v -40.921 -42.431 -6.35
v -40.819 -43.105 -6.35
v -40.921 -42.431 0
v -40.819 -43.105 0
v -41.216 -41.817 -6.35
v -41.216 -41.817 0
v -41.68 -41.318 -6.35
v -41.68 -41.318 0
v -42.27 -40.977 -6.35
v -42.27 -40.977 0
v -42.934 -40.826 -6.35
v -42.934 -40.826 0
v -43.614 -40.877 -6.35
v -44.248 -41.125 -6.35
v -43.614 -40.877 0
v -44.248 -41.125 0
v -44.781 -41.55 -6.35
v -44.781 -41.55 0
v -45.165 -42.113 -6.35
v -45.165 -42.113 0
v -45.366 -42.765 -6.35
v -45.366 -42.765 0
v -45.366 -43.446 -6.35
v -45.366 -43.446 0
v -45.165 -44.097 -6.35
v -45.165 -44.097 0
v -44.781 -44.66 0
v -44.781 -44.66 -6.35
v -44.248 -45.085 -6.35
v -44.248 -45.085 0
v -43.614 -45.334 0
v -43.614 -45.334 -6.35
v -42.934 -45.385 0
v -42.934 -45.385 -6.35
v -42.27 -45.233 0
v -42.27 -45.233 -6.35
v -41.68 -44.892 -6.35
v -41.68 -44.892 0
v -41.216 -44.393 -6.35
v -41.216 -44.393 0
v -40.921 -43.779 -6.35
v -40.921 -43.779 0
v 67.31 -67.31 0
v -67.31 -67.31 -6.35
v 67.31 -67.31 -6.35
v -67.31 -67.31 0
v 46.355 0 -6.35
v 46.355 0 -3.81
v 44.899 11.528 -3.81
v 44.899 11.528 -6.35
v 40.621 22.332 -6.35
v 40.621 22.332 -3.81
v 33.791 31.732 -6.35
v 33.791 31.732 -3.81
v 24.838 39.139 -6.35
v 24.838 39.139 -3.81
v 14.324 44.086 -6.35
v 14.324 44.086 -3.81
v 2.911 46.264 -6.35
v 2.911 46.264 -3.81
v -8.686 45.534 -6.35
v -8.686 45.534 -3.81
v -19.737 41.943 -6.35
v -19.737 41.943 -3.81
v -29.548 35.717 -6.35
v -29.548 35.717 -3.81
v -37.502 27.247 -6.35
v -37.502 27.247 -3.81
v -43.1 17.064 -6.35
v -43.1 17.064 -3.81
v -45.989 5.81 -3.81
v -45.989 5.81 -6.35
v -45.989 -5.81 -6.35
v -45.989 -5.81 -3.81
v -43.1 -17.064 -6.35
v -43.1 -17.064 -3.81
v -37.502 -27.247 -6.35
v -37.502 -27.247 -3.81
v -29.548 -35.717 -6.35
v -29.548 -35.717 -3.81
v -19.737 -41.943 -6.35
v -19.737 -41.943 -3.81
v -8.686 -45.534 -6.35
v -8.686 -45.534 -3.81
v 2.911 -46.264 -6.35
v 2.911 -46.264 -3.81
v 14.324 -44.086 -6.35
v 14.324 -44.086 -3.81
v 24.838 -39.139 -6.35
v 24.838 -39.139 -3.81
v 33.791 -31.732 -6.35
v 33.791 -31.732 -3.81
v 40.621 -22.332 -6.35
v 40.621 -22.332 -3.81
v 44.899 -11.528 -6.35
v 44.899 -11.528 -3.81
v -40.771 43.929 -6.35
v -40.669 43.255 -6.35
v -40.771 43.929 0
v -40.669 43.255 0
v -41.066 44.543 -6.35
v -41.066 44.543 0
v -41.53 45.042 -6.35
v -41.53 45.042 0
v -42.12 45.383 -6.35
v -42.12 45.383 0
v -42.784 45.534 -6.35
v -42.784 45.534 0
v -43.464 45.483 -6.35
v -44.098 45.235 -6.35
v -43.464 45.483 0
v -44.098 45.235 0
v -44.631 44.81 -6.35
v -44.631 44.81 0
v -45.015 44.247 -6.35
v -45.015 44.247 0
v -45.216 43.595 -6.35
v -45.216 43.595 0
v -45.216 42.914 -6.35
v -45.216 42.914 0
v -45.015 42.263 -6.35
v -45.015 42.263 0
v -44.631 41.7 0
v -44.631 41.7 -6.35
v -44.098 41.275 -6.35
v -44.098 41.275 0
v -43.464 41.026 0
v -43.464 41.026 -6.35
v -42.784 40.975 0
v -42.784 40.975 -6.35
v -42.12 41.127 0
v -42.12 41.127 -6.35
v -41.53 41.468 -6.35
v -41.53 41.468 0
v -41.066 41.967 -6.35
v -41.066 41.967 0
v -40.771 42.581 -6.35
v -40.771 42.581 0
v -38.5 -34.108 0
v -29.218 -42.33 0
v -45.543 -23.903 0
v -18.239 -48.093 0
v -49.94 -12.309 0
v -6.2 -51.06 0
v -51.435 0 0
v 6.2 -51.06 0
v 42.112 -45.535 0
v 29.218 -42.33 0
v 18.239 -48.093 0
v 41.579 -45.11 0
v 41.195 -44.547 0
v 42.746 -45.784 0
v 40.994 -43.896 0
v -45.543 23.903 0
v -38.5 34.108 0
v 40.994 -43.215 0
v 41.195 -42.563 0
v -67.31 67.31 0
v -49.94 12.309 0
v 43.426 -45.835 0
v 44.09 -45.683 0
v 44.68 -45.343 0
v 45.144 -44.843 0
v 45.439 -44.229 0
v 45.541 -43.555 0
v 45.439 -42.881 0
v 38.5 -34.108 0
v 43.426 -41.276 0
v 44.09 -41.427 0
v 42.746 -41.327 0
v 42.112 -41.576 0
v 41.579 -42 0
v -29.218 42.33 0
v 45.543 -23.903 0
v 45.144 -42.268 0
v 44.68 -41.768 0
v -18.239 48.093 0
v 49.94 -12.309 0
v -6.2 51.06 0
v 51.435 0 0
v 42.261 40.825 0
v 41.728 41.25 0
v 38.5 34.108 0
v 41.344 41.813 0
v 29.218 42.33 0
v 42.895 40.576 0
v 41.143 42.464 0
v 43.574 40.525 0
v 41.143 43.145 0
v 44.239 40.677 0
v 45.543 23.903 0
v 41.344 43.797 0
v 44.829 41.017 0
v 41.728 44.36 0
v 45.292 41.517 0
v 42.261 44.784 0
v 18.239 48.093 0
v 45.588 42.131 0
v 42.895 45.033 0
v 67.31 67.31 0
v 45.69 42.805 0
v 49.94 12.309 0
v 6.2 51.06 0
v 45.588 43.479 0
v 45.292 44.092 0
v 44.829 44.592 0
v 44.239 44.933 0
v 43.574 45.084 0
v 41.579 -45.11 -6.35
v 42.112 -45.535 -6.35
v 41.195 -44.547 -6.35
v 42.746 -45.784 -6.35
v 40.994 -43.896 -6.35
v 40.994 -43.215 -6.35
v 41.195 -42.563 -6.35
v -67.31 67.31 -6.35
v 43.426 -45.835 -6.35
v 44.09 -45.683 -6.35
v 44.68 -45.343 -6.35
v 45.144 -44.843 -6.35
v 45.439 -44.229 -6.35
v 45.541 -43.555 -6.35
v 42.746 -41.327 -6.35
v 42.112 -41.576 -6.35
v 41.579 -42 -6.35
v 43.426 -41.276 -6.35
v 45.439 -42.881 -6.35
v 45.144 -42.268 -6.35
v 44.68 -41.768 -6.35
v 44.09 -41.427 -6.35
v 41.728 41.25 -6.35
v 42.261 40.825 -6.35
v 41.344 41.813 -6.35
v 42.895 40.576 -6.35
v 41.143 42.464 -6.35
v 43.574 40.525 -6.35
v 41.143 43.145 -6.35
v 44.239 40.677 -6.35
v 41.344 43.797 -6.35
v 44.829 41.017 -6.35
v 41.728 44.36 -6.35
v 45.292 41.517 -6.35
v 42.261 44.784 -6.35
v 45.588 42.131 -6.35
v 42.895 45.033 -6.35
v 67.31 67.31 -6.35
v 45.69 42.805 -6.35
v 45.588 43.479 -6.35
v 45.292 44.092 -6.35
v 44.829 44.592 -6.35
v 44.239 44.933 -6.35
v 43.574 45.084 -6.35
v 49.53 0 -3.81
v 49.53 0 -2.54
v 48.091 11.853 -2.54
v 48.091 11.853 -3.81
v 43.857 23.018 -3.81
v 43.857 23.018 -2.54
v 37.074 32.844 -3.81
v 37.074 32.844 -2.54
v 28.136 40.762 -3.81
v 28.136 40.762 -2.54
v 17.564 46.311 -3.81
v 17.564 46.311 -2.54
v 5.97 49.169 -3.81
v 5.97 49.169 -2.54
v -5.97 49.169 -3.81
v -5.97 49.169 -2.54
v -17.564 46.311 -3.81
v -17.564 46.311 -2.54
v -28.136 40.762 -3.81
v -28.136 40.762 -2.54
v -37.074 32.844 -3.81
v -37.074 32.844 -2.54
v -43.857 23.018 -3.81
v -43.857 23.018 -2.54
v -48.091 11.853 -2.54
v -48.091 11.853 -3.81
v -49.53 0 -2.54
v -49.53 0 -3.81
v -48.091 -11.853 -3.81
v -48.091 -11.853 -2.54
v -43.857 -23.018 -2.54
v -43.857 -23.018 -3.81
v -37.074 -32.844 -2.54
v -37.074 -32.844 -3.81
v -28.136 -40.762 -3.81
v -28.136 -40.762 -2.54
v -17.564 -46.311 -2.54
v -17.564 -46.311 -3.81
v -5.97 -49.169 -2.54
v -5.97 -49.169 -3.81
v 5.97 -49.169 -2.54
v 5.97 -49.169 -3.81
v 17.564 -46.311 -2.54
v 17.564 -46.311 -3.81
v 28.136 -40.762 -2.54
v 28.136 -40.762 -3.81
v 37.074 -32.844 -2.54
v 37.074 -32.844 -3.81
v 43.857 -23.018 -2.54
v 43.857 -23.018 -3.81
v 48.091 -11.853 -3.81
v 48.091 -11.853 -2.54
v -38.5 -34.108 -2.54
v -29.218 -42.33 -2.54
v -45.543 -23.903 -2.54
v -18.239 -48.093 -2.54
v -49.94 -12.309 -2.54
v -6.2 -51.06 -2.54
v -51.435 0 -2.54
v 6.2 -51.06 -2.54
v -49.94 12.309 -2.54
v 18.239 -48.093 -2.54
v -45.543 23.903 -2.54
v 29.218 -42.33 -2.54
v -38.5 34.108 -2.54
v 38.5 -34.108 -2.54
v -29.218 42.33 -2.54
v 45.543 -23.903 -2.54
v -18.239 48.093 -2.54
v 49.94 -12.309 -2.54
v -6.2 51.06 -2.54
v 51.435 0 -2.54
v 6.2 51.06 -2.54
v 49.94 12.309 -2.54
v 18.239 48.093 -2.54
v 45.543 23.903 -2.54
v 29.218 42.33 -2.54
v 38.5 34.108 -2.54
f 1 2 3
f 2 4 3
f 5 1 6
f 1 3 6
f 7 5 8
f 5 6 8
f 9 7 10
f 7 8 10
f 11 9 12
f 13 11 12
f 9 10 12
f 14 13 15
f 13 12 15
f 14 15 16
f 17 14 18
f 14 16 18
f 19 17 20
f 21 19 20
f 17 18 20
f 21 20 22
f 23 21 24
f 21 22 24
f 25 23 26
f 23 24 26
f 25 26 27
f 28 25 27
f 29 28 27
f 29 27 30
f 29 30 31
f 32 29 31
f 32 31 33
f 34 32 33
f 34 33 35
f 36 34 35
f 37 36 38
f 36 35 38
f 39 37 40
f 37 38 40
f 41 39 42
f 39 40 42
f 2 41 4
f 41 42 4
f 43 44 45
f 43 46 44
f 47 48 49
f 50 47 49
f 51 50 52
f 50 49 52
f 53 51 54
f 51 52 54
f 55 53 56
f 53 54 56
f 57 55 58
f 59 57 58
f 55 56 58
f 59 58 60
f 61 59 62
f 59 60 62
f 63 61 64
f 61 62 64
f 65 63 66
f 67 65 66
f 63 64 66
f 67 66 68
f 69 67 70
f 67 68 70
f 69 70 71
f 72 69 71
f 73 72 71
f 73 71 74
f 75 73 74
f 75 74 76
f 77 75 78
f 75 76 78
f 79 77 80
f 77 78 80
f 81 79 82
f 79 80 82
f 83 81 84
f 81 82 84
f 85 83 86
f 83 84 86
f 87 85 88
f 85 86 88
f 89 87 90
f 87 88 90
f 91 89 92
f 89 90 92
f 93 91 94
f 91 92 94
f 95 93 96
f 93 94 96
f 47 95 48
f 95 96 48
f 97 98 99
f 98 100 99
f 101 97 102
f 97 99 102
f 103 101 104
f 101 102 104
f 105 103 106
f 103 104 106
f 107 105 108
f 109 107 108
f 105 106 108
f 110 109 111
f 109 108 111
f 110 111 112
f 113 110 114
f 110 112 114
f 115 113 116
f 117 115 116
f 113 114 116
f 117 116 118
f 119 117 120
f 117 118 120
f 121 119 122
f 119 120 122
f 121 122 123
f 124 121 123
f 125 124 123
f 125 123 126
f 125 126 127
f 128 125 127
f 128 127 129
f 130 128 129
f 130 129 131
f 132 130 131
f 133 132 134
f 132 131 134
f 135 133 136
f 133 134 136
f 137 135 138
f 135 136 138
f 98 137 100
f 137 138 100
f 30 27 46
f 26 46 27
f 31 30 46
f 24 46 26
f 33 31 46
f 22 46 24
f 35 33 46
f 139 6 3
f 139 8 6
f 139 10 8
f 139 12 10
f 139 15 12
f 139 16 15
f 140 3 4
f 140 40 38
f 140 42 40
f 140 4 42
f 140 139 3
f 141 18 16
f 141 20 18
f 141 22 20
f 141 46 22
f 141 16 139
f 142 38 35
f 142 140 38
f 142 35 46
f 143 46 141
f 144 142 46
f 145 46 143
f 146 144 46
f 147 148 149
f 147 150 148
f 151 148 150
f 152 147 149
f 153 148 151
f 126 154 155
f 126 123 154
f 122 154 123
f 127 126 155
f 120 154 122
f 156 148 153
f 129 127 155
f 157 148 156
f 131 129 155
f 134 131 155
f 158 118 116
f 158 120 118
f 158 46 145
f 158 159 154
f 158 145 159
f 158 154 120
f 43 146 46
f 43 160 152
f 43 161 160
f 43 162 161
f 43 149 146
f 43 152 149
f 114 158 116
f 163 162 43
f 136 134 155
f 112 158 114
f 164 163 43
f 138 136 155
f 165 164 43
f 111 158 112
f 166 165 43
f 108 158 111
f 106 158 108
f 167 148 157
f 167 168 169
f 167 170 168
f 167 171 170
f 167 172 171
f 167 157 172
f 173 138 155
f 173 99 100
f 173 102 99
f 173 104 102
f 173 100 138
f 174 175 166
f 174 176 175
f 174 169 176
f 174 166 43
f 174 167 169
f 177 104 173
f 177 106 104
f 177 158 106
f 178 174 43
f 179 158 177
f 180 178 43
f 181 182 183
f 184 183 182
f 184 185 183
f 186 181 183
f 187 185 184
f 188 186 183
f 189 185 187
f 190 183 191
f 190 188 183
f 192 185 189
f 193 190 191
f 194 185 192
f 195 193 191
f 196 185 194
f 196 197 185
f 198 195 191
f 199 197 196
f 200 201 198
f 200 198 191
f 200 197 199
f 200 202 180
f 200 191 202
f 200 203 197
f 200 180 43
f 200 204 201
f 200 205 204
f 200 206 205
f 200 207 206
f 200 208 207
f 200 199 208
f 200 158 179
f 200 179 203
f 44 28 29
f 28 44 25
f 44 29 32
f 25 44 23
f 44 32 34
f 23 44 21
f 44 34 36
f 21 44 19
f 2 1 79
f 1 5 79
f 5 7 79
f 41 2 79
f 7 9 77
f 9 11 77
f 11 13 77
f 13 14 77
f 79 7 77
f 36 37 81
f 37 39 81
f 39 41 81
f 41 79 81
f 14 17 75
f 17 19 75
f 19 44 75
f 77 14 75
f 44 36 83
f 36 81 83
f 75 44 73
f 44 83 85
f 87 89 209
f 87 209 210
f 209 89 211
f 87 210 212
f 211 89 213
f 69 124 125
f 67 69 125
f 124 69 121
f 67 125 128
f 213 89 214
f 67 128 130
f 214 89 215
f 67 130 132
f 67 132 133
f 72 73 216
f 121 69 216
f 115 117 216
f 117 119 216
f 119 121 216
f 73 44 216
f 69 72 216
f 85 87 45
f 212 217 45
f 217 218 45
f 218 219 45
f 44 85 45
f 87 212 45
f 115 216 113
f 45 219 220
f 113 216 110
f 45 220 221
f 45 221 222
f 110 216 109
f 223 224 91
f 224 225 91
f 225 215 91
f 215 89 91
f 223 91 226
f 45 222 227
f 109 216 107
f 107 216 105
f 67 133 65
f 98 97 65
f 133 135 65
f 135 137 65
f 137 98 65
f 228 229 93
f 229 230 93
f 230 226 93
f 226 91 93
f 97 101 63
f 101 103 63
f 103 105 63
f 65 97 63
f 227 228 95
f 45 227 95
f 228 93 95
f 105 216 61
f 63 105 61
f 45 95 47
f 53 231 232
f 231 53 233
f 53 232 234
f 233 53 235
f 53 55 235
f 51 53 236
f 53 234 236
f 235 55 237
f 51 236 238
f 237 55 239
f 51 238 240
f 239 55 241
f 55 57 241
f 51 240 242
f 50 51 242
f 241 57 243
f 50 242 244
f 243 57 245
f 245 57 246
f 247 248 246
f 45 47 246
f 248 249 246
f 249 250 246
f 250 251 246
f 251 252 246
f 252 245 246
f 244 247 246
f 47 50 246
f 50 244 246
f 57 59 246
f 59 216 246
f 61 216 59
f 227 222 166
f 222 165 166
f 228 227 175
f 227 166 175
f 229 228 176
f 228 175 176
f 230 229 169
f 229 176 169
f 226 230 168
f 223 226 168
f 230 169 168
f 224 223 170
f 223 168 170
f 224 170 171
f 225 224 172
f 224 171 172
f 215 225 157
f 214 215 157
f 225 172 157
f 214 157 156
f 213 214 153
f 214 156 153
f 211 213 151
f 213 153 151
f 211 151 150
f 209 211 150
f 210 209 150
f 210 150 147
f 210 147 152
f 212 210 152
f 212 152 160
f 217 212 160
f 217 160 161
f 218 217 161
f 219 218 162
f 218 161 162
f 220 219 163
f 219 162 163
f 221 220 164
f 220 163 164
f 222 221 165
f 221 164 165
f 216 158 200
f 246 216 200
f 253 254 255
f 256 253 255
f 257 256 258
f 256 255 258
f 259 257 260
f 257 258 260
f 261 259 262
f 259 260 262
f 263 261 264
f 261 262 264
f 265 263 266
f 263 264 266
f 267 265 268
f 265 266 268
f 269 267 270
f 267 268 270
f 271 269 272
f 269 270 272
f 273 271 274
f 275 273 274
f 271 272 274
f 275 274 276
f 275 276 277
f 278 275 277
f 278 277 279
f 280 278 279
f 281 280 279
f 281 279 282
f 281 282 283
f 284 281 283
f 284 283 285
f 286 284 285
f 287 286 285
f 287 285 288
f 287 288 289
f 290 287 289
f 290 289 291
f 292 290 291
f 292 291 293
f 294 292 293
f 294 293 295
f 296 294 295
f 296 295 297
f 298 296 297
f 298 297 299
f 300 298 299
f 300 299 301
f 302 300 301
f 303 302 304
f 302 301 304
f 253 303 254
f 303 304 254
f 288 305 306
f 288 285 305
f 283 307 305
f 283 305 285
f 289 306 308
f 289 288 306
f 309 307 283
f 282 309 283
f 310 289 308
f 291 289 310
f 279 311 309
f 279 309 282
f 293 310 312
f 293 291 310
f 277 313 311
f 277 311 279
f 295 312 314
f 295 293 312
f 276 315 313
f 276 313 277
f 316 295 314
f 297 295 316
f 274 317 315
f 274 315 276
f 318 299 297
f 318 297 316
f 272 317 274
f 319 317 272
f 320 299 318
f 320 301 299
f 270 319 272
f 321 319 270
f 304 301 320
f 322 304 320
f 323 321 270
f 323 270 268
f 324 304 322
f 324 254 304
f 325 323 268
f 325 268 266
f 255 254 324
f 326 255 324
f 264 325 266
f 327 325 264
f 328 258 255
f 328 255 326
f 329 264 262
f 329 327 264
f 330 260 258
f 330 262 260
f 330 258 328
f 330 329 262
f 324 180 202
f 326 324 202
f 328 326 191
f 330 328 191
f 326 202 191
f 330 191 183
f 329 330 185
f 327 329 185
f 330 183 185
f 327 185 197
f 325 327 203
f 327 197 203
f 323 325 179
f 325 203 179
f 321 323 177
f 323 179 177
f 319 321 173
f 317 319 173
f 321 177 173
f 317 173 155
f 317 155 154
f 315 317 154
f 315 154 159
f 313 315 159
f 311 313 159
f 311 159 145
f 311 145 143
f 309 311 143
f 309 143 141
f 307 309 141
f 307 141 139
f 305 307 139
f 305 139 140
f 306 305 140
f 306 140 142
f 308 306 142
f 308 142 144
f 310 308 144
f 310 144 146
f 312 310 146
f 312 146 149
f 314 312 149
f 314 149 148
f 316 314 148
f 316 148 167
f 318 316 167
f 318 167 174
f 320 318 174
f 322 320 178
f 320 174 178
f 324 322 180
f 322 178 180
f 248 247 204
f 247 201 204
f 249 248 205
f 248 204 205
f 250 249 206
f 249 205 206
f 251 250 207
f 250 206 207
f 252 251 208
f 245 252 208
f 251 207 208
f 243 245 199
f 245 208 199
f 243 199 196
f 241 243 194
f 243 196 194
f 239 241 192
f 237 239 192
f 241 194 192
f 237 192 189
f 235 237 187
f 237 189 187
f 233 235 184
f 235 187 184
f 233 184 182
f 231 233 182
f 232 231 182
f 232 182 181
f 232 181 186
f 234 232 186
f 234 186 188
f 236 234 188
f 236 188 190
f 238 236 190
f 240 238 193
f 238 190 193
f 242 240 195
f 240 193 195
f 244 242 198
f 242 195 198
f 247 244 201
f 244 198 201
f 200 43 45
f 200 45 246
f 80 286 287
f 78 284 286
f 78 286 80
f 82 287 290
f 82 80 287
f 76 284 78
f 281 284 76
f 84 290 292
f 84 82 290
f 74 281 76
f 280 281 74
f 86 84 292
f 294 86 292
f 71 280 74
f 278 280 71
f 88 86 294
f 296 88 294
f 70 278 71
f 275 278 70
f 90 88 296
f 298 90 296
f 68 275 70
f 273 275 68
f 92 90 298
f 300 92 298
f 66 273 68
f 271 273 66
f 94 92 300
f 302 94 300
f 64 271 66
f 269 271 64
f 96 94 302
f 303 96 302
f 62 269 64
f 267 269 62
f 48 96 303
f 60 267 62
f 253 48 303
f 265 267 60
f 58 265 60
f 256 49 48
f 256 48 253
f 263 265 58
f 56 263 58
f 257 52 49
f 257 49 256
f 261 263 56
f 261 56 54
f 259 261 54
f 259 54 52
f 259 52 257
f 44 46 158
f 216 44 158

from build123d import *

# Parameters (mm, degrees)
F0_W     = 134.62
F0_H     = 134.62
F0_R     = 2.286
F0_R_2   = 51.435
F4_DEPTH = 6.35
F2_W     = 134.62
F2_H     = 134.62
F2_R     = 2.286
F2_R_2   = 49.53
F7_DEPTH = 3.81
F6_W     = 134.62
F6_H     = 134.62
F6_R     = 2.286
F6_R_2   = 46.355
F8_DEPTH = 2.54


# Not quite as in the source:
# - the program builds the solid bodies; features that only make, move or delete a surface that nothing else refers to are left out


with BuildPart() as f4:
    # F0 (on Top) → F4 (new body)
    with BuildSketch(Plane.XY):
        Rectangle(F0_W, F0_H)
        with Locations((-43.1052293811, -43.1052293811)):
            Circle(F0_R, mode=Mode.SUBTRACT)
        with Locations((43.2547706189, -43.5552815736)):
            Circle(F0_R, mode=Mode.SUBTRACT)
        with Locations((-42.9551675437, 43.2547706189)):
            Circle(F0_R, mode=Mode.SUBTRACT)
        Circle(F0_R_2, mode=Mode.SUBTRACT)
        with Locations((43.4036597586, 42.8047184264)):
            Circle(F0_R, mode=Mode.SUBTRACT)
    extrude(amount=-F4_DEPTH)

    # F2 (on offset) → F7 (join)
    with BuildSketch(Plane.XY.offset(-2.54)):
        Rectangle(F2_W, F2_H)
        with Locations((-43.1052293811, -43.1052293811)):
            Circle(F2_R, mode=Mode.SUBTRACT)
        with Locations((43.2547706189, -43.5552815736)):
            Circle(F2_R, mode=Mode.SUBTRACT)
        with Locations((-42.9551675437, 43.2547706189)):
            Circle(F2_R, mode=Mode.SUBTRACT)
        Circle(F2_R_2, mode=Mode.SUBTRACT)
        with Locations((43.4036597586, 42.8047184264)):
            Circle(F2_R, mode=Mode.SUBTRACT)
    extrude(amount=-F7_DEPTH)

    # F6 (on offset) → F8 (join)
    with BuildSketch(Plane.XY.offset(-3.81)):
        Rectangle(F6_W, F6_H)
        with Locations((-43.1052293811, -43.1052293811)):
            Circle(F6_R, mode=Mode.SUBTRACT)
        with Locations((43.2547706189, -43.5552815736)):
            Circle(F6_R, mode=Mode.SUBTRACT)
        with Locations((-42.9551675437, 43.2547706189)):
            Circle(F6_R, mode=Mode.SUBTRACT)
        Circle(F6_R_2, mode=Mode.SUBTRACT)
        with Locations((43.4036597586, 42.8047184264)):
            Circle(F6_R, mode=Mode.SUBTRACT)
    extrude(amount=-F8_DEPTH)


solid = f4.part
